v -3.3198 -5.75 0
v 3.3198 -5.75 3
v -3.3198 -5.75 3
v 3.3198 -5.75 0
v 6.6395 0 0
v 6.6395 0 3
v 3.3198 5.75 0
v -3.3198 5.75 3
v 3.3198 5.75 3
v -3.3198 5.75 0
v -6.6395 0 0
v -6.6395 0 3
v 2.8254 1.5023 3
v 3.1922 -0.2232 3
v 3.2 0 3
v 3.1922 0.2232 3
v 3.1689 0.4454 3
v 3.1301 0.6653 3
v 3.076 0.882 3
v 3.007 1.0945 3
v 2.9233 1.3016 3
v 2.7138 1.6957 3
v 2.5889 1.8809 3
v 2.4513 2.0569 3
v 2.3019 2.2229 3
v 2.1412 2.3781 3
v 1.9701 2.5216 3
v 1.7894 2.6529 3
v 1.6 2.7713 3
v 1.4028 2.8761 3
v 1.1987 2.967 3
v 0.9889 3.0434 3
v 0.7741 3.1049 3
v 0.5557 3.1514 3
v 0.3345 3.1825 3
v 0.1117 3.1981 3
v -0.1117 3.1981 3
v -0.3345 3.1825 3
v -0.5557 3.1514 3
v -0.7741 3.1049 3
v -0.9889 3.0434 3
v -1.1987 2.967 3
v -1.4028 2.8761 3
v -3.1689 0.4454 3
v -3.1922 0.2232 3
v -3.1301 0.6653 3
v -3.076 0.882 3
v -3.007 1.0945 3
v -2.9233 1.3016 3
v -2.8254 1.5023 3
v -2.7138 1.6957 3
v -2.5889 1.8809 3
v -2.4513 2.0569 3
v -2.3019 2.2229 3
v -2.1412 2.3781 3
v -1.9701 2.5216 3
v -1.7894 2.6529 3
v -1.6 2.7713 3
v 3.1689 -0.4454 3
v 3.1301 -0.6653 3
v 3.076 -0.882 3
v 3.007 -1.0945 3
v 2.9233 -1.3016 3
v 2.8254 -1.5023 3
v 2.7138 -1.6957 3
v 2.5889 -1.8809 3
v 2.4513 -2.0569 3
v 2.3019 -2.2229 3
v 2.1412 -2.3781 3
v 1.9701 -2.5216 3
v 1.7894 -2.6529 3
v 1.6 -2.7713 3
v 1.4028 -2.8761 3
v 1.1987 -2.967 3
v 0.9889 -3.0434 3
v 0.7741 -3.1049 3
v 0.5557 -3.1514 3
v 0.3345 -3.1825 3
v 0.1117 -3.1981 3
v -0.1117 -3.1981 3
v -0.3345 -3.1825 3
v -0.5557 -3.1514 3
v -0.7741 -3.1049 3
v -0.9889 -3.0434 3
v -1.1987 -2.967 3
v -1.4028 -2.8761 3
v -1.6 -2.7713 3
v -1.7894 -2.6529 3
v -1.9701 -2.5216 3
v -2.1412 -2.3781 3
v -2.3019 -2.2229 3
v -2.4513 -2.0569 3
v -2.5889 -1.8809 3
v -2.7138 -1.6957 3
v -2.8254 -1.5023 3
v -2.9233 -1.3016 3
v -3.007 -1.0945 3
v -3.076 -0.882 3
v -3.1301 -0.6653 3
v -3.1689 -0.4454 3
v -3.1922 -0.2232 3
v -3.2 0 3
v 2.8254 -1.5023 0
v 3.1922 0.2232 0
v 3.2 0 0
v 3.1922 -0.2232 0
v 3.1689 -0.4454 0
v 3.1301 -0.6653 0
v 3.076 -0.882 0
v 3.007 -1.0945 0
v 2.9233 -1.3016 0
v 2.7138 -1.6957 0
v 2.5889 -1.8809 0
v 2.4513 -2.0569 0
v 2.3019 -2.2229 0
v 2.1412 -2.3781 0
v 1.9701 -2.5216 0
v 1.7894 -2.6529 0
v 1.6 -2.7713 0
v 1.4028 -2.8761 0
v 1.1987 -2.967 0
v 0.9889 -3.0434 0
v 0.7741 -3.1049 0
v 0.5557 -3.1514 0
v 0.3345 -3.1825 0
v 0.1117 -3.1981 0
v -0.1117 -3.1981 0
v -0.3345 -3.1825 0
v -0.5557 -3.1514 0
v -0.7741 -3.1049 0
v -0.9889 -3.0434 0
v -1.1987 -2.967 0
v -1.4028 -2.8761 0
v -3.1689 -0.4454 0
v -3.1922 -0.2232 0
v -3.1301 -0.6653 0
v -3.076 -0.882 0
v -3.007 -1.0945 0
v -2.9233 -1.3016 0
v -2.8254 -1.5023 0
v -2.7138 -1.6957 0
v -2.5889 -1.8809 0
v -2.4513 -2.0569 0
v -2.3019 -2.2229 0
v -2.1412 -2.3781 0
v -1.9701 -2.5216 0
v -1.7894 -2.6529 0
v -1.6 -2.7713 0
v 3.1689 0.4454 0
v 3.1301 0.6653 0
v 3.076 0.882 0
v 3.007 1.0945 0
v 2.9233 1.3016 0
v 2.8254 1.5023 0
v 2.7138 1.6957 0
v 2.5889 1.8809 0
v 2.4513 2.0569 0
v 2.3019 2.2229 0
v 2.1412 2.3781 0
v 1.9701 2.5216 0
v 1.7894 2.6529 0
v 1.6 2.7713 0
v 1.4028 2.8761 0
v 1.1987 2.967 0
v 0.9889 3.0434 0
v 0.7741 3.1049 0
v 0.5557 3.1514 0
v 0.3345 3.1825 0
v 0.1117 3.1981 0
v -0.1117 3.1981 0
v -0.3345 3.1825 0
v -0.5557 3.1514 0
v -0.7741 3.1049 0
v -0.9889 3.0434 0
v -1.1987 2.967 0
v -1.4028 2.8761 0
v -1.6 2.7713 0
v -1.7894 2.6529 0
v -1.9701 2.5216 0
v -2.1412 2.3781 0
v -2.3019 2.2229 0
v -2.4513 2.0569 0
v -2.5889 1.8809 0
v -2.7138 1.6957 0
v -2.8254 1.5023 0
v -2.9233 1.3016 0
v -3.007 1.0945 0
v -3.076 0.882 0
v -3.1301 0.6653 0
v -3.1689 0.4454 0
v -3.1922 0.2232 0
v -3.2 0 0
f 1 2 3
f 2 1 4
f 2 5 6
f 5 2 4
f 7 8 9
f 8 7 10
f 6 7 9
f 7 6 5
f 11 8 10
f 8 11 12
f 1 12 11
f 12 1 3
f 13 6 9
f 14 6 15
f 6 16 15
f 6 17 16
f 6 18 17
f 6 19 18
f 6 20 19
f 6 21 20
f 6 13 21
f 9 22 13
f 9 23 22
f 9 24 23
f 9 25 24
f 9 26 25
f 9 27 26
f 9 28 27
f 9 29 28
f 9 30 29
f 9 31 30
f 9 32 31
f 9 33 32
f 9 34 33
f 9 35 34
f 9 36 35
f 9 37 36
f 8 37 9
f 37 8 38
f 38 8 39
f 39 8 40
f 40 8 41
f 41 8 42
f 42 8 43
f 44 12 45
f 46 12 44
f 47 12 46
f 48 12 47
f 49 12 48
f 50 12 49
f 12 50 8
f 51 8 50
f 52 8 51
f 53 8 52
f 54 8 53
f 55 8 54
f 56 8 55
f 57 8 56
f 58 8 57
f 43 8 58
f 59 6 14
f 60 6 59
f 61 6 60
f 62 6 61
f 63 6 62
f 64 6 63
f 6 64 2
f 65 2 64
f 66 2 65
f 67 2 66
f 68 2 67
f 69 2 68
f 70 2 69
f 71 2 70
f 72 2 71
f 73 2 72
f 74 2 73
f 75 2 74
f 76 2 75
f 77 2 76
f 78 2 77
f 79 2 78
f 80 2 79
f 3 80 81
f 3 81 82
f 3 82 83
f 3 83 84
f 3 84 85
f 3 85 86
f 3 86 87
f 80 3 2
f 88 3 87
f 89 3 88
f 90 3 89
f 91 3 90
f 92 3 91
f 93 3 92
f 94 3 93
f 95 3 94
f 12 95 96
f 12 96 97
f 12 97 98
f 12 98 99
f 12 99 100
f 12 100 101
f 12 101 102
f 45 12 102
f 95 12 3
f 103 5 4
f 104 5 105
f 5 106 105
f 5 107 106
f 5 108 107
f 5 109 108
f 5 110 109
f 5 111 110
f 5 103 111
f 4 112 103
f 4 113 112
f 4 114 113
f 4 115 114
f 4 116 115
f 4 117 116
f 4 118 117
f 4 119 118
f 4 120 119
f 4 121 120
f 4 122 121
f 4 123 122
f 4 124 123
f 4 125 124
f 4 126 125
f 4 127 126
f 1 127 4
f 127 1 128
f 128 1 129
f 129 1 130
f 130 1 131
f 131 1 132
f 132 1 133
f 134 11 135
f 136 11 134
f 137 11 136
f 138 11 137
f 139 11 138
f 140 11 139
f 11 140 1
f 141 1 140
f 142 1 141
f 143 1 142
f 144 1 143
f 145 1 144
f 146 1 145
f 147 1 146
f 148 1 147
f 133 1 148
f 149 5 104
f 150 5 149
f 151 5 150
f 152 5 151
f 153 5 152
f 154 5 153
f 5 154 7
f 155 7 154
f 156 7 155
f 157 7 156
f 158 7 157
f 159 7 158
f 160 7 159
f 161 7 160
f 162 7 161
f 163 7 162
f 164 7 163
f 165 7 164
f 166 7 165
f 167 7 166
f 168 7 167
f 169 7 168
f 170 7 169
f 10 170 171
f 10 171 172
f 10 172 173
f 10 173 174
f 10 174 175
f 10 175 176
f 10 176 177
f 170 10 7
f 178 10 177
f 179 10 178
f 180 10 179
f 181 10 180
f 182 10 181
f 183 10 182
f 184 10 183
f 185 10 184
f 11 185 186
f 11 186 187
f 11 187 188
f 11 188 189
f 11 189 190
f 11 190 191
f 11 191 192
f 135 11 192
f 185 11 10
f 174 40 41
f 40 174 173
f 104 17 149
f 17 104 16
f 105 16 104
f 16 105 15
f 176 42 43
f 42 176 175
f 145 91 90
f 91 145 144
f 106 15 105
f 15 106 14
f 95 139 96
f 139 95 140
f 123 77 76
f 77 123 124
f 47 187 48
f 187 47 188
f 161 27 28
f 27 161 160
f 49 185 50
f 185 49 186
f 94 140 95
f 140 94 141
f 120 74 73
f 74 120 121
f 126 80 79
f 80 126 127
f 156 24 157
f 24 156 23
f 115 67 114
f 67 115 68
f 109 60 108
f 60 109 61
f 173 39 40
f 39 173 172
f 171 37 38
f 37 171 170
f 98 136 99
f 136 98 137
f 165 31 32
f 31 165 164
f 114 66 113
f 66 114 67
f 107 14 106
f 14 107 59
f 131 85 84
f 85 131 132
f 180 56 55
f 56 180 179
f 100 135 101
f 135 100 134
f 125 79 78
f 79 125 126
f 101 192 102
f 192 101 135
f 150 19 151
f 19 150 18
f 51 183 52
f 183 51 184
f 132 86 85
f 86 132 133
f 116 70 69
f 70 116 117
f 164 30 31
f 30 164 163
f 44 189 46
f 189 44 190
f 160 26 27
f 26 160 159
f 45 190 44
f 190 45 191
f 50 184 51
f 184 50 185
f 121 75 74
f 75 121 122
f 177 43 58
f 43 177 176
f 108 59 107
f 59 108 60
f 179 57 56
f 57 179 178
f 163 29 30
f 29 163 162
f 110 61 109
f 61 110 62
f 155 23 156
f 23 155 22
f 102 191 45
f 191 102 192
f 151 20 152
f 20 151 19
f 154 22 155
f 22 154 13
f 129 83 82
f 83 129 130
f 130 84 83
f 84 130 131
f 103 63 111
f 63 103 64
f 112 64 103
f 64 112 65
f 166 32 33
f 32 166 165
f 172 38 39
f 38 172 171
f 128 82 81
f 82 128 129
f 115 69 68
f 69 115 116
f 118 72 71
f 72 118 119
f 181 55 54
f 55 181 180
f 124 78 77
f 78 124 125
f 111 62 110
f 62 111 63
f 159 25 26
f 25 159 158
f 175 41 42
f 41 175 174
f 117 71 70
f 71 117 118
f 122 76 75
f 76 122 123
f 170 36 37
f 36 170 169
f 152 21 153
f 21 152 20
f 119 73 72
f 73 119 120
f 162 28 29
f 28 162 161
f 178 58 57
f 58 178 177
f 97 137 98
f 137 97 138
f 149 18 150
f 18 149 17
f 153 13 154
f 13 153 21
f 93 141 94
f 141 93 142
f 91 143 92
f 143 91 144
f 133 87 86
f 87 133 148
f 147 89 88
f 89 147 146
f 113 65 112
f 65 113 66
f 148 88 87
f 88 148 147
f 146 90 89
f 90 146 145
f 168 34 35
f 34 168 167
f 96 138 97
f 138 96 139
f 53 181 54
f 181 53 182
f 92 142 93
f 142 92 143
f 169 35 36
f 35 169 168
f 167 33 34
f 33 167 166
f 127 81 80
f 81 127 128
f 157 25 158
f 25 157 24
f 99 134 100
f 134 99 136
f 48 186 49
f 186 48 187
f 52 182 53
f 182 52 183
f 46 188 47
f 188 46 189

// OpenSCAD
$fn = 120;

af = 11.5;          // across flats (mm)
thickness = 3.0;    // nut thickness (mm)
screw_d = 6.0;      // nominal screw diameter (mm)

// Clearance for M6 (typical): ~6.4 mm
hole_d = 6.4;

// Hex geometry: across flats = 2 * apothem => circumradius = af / sqrt(3)
hex_r = af / sqrt(3);

difference() {
    cylinder(h = thickness, r = hex_r, $fn = 6);
    translate([0, 0, -0.2])
        cylinder(h = thickness + 0.4, d = hole_d, $fn = 90);
}
